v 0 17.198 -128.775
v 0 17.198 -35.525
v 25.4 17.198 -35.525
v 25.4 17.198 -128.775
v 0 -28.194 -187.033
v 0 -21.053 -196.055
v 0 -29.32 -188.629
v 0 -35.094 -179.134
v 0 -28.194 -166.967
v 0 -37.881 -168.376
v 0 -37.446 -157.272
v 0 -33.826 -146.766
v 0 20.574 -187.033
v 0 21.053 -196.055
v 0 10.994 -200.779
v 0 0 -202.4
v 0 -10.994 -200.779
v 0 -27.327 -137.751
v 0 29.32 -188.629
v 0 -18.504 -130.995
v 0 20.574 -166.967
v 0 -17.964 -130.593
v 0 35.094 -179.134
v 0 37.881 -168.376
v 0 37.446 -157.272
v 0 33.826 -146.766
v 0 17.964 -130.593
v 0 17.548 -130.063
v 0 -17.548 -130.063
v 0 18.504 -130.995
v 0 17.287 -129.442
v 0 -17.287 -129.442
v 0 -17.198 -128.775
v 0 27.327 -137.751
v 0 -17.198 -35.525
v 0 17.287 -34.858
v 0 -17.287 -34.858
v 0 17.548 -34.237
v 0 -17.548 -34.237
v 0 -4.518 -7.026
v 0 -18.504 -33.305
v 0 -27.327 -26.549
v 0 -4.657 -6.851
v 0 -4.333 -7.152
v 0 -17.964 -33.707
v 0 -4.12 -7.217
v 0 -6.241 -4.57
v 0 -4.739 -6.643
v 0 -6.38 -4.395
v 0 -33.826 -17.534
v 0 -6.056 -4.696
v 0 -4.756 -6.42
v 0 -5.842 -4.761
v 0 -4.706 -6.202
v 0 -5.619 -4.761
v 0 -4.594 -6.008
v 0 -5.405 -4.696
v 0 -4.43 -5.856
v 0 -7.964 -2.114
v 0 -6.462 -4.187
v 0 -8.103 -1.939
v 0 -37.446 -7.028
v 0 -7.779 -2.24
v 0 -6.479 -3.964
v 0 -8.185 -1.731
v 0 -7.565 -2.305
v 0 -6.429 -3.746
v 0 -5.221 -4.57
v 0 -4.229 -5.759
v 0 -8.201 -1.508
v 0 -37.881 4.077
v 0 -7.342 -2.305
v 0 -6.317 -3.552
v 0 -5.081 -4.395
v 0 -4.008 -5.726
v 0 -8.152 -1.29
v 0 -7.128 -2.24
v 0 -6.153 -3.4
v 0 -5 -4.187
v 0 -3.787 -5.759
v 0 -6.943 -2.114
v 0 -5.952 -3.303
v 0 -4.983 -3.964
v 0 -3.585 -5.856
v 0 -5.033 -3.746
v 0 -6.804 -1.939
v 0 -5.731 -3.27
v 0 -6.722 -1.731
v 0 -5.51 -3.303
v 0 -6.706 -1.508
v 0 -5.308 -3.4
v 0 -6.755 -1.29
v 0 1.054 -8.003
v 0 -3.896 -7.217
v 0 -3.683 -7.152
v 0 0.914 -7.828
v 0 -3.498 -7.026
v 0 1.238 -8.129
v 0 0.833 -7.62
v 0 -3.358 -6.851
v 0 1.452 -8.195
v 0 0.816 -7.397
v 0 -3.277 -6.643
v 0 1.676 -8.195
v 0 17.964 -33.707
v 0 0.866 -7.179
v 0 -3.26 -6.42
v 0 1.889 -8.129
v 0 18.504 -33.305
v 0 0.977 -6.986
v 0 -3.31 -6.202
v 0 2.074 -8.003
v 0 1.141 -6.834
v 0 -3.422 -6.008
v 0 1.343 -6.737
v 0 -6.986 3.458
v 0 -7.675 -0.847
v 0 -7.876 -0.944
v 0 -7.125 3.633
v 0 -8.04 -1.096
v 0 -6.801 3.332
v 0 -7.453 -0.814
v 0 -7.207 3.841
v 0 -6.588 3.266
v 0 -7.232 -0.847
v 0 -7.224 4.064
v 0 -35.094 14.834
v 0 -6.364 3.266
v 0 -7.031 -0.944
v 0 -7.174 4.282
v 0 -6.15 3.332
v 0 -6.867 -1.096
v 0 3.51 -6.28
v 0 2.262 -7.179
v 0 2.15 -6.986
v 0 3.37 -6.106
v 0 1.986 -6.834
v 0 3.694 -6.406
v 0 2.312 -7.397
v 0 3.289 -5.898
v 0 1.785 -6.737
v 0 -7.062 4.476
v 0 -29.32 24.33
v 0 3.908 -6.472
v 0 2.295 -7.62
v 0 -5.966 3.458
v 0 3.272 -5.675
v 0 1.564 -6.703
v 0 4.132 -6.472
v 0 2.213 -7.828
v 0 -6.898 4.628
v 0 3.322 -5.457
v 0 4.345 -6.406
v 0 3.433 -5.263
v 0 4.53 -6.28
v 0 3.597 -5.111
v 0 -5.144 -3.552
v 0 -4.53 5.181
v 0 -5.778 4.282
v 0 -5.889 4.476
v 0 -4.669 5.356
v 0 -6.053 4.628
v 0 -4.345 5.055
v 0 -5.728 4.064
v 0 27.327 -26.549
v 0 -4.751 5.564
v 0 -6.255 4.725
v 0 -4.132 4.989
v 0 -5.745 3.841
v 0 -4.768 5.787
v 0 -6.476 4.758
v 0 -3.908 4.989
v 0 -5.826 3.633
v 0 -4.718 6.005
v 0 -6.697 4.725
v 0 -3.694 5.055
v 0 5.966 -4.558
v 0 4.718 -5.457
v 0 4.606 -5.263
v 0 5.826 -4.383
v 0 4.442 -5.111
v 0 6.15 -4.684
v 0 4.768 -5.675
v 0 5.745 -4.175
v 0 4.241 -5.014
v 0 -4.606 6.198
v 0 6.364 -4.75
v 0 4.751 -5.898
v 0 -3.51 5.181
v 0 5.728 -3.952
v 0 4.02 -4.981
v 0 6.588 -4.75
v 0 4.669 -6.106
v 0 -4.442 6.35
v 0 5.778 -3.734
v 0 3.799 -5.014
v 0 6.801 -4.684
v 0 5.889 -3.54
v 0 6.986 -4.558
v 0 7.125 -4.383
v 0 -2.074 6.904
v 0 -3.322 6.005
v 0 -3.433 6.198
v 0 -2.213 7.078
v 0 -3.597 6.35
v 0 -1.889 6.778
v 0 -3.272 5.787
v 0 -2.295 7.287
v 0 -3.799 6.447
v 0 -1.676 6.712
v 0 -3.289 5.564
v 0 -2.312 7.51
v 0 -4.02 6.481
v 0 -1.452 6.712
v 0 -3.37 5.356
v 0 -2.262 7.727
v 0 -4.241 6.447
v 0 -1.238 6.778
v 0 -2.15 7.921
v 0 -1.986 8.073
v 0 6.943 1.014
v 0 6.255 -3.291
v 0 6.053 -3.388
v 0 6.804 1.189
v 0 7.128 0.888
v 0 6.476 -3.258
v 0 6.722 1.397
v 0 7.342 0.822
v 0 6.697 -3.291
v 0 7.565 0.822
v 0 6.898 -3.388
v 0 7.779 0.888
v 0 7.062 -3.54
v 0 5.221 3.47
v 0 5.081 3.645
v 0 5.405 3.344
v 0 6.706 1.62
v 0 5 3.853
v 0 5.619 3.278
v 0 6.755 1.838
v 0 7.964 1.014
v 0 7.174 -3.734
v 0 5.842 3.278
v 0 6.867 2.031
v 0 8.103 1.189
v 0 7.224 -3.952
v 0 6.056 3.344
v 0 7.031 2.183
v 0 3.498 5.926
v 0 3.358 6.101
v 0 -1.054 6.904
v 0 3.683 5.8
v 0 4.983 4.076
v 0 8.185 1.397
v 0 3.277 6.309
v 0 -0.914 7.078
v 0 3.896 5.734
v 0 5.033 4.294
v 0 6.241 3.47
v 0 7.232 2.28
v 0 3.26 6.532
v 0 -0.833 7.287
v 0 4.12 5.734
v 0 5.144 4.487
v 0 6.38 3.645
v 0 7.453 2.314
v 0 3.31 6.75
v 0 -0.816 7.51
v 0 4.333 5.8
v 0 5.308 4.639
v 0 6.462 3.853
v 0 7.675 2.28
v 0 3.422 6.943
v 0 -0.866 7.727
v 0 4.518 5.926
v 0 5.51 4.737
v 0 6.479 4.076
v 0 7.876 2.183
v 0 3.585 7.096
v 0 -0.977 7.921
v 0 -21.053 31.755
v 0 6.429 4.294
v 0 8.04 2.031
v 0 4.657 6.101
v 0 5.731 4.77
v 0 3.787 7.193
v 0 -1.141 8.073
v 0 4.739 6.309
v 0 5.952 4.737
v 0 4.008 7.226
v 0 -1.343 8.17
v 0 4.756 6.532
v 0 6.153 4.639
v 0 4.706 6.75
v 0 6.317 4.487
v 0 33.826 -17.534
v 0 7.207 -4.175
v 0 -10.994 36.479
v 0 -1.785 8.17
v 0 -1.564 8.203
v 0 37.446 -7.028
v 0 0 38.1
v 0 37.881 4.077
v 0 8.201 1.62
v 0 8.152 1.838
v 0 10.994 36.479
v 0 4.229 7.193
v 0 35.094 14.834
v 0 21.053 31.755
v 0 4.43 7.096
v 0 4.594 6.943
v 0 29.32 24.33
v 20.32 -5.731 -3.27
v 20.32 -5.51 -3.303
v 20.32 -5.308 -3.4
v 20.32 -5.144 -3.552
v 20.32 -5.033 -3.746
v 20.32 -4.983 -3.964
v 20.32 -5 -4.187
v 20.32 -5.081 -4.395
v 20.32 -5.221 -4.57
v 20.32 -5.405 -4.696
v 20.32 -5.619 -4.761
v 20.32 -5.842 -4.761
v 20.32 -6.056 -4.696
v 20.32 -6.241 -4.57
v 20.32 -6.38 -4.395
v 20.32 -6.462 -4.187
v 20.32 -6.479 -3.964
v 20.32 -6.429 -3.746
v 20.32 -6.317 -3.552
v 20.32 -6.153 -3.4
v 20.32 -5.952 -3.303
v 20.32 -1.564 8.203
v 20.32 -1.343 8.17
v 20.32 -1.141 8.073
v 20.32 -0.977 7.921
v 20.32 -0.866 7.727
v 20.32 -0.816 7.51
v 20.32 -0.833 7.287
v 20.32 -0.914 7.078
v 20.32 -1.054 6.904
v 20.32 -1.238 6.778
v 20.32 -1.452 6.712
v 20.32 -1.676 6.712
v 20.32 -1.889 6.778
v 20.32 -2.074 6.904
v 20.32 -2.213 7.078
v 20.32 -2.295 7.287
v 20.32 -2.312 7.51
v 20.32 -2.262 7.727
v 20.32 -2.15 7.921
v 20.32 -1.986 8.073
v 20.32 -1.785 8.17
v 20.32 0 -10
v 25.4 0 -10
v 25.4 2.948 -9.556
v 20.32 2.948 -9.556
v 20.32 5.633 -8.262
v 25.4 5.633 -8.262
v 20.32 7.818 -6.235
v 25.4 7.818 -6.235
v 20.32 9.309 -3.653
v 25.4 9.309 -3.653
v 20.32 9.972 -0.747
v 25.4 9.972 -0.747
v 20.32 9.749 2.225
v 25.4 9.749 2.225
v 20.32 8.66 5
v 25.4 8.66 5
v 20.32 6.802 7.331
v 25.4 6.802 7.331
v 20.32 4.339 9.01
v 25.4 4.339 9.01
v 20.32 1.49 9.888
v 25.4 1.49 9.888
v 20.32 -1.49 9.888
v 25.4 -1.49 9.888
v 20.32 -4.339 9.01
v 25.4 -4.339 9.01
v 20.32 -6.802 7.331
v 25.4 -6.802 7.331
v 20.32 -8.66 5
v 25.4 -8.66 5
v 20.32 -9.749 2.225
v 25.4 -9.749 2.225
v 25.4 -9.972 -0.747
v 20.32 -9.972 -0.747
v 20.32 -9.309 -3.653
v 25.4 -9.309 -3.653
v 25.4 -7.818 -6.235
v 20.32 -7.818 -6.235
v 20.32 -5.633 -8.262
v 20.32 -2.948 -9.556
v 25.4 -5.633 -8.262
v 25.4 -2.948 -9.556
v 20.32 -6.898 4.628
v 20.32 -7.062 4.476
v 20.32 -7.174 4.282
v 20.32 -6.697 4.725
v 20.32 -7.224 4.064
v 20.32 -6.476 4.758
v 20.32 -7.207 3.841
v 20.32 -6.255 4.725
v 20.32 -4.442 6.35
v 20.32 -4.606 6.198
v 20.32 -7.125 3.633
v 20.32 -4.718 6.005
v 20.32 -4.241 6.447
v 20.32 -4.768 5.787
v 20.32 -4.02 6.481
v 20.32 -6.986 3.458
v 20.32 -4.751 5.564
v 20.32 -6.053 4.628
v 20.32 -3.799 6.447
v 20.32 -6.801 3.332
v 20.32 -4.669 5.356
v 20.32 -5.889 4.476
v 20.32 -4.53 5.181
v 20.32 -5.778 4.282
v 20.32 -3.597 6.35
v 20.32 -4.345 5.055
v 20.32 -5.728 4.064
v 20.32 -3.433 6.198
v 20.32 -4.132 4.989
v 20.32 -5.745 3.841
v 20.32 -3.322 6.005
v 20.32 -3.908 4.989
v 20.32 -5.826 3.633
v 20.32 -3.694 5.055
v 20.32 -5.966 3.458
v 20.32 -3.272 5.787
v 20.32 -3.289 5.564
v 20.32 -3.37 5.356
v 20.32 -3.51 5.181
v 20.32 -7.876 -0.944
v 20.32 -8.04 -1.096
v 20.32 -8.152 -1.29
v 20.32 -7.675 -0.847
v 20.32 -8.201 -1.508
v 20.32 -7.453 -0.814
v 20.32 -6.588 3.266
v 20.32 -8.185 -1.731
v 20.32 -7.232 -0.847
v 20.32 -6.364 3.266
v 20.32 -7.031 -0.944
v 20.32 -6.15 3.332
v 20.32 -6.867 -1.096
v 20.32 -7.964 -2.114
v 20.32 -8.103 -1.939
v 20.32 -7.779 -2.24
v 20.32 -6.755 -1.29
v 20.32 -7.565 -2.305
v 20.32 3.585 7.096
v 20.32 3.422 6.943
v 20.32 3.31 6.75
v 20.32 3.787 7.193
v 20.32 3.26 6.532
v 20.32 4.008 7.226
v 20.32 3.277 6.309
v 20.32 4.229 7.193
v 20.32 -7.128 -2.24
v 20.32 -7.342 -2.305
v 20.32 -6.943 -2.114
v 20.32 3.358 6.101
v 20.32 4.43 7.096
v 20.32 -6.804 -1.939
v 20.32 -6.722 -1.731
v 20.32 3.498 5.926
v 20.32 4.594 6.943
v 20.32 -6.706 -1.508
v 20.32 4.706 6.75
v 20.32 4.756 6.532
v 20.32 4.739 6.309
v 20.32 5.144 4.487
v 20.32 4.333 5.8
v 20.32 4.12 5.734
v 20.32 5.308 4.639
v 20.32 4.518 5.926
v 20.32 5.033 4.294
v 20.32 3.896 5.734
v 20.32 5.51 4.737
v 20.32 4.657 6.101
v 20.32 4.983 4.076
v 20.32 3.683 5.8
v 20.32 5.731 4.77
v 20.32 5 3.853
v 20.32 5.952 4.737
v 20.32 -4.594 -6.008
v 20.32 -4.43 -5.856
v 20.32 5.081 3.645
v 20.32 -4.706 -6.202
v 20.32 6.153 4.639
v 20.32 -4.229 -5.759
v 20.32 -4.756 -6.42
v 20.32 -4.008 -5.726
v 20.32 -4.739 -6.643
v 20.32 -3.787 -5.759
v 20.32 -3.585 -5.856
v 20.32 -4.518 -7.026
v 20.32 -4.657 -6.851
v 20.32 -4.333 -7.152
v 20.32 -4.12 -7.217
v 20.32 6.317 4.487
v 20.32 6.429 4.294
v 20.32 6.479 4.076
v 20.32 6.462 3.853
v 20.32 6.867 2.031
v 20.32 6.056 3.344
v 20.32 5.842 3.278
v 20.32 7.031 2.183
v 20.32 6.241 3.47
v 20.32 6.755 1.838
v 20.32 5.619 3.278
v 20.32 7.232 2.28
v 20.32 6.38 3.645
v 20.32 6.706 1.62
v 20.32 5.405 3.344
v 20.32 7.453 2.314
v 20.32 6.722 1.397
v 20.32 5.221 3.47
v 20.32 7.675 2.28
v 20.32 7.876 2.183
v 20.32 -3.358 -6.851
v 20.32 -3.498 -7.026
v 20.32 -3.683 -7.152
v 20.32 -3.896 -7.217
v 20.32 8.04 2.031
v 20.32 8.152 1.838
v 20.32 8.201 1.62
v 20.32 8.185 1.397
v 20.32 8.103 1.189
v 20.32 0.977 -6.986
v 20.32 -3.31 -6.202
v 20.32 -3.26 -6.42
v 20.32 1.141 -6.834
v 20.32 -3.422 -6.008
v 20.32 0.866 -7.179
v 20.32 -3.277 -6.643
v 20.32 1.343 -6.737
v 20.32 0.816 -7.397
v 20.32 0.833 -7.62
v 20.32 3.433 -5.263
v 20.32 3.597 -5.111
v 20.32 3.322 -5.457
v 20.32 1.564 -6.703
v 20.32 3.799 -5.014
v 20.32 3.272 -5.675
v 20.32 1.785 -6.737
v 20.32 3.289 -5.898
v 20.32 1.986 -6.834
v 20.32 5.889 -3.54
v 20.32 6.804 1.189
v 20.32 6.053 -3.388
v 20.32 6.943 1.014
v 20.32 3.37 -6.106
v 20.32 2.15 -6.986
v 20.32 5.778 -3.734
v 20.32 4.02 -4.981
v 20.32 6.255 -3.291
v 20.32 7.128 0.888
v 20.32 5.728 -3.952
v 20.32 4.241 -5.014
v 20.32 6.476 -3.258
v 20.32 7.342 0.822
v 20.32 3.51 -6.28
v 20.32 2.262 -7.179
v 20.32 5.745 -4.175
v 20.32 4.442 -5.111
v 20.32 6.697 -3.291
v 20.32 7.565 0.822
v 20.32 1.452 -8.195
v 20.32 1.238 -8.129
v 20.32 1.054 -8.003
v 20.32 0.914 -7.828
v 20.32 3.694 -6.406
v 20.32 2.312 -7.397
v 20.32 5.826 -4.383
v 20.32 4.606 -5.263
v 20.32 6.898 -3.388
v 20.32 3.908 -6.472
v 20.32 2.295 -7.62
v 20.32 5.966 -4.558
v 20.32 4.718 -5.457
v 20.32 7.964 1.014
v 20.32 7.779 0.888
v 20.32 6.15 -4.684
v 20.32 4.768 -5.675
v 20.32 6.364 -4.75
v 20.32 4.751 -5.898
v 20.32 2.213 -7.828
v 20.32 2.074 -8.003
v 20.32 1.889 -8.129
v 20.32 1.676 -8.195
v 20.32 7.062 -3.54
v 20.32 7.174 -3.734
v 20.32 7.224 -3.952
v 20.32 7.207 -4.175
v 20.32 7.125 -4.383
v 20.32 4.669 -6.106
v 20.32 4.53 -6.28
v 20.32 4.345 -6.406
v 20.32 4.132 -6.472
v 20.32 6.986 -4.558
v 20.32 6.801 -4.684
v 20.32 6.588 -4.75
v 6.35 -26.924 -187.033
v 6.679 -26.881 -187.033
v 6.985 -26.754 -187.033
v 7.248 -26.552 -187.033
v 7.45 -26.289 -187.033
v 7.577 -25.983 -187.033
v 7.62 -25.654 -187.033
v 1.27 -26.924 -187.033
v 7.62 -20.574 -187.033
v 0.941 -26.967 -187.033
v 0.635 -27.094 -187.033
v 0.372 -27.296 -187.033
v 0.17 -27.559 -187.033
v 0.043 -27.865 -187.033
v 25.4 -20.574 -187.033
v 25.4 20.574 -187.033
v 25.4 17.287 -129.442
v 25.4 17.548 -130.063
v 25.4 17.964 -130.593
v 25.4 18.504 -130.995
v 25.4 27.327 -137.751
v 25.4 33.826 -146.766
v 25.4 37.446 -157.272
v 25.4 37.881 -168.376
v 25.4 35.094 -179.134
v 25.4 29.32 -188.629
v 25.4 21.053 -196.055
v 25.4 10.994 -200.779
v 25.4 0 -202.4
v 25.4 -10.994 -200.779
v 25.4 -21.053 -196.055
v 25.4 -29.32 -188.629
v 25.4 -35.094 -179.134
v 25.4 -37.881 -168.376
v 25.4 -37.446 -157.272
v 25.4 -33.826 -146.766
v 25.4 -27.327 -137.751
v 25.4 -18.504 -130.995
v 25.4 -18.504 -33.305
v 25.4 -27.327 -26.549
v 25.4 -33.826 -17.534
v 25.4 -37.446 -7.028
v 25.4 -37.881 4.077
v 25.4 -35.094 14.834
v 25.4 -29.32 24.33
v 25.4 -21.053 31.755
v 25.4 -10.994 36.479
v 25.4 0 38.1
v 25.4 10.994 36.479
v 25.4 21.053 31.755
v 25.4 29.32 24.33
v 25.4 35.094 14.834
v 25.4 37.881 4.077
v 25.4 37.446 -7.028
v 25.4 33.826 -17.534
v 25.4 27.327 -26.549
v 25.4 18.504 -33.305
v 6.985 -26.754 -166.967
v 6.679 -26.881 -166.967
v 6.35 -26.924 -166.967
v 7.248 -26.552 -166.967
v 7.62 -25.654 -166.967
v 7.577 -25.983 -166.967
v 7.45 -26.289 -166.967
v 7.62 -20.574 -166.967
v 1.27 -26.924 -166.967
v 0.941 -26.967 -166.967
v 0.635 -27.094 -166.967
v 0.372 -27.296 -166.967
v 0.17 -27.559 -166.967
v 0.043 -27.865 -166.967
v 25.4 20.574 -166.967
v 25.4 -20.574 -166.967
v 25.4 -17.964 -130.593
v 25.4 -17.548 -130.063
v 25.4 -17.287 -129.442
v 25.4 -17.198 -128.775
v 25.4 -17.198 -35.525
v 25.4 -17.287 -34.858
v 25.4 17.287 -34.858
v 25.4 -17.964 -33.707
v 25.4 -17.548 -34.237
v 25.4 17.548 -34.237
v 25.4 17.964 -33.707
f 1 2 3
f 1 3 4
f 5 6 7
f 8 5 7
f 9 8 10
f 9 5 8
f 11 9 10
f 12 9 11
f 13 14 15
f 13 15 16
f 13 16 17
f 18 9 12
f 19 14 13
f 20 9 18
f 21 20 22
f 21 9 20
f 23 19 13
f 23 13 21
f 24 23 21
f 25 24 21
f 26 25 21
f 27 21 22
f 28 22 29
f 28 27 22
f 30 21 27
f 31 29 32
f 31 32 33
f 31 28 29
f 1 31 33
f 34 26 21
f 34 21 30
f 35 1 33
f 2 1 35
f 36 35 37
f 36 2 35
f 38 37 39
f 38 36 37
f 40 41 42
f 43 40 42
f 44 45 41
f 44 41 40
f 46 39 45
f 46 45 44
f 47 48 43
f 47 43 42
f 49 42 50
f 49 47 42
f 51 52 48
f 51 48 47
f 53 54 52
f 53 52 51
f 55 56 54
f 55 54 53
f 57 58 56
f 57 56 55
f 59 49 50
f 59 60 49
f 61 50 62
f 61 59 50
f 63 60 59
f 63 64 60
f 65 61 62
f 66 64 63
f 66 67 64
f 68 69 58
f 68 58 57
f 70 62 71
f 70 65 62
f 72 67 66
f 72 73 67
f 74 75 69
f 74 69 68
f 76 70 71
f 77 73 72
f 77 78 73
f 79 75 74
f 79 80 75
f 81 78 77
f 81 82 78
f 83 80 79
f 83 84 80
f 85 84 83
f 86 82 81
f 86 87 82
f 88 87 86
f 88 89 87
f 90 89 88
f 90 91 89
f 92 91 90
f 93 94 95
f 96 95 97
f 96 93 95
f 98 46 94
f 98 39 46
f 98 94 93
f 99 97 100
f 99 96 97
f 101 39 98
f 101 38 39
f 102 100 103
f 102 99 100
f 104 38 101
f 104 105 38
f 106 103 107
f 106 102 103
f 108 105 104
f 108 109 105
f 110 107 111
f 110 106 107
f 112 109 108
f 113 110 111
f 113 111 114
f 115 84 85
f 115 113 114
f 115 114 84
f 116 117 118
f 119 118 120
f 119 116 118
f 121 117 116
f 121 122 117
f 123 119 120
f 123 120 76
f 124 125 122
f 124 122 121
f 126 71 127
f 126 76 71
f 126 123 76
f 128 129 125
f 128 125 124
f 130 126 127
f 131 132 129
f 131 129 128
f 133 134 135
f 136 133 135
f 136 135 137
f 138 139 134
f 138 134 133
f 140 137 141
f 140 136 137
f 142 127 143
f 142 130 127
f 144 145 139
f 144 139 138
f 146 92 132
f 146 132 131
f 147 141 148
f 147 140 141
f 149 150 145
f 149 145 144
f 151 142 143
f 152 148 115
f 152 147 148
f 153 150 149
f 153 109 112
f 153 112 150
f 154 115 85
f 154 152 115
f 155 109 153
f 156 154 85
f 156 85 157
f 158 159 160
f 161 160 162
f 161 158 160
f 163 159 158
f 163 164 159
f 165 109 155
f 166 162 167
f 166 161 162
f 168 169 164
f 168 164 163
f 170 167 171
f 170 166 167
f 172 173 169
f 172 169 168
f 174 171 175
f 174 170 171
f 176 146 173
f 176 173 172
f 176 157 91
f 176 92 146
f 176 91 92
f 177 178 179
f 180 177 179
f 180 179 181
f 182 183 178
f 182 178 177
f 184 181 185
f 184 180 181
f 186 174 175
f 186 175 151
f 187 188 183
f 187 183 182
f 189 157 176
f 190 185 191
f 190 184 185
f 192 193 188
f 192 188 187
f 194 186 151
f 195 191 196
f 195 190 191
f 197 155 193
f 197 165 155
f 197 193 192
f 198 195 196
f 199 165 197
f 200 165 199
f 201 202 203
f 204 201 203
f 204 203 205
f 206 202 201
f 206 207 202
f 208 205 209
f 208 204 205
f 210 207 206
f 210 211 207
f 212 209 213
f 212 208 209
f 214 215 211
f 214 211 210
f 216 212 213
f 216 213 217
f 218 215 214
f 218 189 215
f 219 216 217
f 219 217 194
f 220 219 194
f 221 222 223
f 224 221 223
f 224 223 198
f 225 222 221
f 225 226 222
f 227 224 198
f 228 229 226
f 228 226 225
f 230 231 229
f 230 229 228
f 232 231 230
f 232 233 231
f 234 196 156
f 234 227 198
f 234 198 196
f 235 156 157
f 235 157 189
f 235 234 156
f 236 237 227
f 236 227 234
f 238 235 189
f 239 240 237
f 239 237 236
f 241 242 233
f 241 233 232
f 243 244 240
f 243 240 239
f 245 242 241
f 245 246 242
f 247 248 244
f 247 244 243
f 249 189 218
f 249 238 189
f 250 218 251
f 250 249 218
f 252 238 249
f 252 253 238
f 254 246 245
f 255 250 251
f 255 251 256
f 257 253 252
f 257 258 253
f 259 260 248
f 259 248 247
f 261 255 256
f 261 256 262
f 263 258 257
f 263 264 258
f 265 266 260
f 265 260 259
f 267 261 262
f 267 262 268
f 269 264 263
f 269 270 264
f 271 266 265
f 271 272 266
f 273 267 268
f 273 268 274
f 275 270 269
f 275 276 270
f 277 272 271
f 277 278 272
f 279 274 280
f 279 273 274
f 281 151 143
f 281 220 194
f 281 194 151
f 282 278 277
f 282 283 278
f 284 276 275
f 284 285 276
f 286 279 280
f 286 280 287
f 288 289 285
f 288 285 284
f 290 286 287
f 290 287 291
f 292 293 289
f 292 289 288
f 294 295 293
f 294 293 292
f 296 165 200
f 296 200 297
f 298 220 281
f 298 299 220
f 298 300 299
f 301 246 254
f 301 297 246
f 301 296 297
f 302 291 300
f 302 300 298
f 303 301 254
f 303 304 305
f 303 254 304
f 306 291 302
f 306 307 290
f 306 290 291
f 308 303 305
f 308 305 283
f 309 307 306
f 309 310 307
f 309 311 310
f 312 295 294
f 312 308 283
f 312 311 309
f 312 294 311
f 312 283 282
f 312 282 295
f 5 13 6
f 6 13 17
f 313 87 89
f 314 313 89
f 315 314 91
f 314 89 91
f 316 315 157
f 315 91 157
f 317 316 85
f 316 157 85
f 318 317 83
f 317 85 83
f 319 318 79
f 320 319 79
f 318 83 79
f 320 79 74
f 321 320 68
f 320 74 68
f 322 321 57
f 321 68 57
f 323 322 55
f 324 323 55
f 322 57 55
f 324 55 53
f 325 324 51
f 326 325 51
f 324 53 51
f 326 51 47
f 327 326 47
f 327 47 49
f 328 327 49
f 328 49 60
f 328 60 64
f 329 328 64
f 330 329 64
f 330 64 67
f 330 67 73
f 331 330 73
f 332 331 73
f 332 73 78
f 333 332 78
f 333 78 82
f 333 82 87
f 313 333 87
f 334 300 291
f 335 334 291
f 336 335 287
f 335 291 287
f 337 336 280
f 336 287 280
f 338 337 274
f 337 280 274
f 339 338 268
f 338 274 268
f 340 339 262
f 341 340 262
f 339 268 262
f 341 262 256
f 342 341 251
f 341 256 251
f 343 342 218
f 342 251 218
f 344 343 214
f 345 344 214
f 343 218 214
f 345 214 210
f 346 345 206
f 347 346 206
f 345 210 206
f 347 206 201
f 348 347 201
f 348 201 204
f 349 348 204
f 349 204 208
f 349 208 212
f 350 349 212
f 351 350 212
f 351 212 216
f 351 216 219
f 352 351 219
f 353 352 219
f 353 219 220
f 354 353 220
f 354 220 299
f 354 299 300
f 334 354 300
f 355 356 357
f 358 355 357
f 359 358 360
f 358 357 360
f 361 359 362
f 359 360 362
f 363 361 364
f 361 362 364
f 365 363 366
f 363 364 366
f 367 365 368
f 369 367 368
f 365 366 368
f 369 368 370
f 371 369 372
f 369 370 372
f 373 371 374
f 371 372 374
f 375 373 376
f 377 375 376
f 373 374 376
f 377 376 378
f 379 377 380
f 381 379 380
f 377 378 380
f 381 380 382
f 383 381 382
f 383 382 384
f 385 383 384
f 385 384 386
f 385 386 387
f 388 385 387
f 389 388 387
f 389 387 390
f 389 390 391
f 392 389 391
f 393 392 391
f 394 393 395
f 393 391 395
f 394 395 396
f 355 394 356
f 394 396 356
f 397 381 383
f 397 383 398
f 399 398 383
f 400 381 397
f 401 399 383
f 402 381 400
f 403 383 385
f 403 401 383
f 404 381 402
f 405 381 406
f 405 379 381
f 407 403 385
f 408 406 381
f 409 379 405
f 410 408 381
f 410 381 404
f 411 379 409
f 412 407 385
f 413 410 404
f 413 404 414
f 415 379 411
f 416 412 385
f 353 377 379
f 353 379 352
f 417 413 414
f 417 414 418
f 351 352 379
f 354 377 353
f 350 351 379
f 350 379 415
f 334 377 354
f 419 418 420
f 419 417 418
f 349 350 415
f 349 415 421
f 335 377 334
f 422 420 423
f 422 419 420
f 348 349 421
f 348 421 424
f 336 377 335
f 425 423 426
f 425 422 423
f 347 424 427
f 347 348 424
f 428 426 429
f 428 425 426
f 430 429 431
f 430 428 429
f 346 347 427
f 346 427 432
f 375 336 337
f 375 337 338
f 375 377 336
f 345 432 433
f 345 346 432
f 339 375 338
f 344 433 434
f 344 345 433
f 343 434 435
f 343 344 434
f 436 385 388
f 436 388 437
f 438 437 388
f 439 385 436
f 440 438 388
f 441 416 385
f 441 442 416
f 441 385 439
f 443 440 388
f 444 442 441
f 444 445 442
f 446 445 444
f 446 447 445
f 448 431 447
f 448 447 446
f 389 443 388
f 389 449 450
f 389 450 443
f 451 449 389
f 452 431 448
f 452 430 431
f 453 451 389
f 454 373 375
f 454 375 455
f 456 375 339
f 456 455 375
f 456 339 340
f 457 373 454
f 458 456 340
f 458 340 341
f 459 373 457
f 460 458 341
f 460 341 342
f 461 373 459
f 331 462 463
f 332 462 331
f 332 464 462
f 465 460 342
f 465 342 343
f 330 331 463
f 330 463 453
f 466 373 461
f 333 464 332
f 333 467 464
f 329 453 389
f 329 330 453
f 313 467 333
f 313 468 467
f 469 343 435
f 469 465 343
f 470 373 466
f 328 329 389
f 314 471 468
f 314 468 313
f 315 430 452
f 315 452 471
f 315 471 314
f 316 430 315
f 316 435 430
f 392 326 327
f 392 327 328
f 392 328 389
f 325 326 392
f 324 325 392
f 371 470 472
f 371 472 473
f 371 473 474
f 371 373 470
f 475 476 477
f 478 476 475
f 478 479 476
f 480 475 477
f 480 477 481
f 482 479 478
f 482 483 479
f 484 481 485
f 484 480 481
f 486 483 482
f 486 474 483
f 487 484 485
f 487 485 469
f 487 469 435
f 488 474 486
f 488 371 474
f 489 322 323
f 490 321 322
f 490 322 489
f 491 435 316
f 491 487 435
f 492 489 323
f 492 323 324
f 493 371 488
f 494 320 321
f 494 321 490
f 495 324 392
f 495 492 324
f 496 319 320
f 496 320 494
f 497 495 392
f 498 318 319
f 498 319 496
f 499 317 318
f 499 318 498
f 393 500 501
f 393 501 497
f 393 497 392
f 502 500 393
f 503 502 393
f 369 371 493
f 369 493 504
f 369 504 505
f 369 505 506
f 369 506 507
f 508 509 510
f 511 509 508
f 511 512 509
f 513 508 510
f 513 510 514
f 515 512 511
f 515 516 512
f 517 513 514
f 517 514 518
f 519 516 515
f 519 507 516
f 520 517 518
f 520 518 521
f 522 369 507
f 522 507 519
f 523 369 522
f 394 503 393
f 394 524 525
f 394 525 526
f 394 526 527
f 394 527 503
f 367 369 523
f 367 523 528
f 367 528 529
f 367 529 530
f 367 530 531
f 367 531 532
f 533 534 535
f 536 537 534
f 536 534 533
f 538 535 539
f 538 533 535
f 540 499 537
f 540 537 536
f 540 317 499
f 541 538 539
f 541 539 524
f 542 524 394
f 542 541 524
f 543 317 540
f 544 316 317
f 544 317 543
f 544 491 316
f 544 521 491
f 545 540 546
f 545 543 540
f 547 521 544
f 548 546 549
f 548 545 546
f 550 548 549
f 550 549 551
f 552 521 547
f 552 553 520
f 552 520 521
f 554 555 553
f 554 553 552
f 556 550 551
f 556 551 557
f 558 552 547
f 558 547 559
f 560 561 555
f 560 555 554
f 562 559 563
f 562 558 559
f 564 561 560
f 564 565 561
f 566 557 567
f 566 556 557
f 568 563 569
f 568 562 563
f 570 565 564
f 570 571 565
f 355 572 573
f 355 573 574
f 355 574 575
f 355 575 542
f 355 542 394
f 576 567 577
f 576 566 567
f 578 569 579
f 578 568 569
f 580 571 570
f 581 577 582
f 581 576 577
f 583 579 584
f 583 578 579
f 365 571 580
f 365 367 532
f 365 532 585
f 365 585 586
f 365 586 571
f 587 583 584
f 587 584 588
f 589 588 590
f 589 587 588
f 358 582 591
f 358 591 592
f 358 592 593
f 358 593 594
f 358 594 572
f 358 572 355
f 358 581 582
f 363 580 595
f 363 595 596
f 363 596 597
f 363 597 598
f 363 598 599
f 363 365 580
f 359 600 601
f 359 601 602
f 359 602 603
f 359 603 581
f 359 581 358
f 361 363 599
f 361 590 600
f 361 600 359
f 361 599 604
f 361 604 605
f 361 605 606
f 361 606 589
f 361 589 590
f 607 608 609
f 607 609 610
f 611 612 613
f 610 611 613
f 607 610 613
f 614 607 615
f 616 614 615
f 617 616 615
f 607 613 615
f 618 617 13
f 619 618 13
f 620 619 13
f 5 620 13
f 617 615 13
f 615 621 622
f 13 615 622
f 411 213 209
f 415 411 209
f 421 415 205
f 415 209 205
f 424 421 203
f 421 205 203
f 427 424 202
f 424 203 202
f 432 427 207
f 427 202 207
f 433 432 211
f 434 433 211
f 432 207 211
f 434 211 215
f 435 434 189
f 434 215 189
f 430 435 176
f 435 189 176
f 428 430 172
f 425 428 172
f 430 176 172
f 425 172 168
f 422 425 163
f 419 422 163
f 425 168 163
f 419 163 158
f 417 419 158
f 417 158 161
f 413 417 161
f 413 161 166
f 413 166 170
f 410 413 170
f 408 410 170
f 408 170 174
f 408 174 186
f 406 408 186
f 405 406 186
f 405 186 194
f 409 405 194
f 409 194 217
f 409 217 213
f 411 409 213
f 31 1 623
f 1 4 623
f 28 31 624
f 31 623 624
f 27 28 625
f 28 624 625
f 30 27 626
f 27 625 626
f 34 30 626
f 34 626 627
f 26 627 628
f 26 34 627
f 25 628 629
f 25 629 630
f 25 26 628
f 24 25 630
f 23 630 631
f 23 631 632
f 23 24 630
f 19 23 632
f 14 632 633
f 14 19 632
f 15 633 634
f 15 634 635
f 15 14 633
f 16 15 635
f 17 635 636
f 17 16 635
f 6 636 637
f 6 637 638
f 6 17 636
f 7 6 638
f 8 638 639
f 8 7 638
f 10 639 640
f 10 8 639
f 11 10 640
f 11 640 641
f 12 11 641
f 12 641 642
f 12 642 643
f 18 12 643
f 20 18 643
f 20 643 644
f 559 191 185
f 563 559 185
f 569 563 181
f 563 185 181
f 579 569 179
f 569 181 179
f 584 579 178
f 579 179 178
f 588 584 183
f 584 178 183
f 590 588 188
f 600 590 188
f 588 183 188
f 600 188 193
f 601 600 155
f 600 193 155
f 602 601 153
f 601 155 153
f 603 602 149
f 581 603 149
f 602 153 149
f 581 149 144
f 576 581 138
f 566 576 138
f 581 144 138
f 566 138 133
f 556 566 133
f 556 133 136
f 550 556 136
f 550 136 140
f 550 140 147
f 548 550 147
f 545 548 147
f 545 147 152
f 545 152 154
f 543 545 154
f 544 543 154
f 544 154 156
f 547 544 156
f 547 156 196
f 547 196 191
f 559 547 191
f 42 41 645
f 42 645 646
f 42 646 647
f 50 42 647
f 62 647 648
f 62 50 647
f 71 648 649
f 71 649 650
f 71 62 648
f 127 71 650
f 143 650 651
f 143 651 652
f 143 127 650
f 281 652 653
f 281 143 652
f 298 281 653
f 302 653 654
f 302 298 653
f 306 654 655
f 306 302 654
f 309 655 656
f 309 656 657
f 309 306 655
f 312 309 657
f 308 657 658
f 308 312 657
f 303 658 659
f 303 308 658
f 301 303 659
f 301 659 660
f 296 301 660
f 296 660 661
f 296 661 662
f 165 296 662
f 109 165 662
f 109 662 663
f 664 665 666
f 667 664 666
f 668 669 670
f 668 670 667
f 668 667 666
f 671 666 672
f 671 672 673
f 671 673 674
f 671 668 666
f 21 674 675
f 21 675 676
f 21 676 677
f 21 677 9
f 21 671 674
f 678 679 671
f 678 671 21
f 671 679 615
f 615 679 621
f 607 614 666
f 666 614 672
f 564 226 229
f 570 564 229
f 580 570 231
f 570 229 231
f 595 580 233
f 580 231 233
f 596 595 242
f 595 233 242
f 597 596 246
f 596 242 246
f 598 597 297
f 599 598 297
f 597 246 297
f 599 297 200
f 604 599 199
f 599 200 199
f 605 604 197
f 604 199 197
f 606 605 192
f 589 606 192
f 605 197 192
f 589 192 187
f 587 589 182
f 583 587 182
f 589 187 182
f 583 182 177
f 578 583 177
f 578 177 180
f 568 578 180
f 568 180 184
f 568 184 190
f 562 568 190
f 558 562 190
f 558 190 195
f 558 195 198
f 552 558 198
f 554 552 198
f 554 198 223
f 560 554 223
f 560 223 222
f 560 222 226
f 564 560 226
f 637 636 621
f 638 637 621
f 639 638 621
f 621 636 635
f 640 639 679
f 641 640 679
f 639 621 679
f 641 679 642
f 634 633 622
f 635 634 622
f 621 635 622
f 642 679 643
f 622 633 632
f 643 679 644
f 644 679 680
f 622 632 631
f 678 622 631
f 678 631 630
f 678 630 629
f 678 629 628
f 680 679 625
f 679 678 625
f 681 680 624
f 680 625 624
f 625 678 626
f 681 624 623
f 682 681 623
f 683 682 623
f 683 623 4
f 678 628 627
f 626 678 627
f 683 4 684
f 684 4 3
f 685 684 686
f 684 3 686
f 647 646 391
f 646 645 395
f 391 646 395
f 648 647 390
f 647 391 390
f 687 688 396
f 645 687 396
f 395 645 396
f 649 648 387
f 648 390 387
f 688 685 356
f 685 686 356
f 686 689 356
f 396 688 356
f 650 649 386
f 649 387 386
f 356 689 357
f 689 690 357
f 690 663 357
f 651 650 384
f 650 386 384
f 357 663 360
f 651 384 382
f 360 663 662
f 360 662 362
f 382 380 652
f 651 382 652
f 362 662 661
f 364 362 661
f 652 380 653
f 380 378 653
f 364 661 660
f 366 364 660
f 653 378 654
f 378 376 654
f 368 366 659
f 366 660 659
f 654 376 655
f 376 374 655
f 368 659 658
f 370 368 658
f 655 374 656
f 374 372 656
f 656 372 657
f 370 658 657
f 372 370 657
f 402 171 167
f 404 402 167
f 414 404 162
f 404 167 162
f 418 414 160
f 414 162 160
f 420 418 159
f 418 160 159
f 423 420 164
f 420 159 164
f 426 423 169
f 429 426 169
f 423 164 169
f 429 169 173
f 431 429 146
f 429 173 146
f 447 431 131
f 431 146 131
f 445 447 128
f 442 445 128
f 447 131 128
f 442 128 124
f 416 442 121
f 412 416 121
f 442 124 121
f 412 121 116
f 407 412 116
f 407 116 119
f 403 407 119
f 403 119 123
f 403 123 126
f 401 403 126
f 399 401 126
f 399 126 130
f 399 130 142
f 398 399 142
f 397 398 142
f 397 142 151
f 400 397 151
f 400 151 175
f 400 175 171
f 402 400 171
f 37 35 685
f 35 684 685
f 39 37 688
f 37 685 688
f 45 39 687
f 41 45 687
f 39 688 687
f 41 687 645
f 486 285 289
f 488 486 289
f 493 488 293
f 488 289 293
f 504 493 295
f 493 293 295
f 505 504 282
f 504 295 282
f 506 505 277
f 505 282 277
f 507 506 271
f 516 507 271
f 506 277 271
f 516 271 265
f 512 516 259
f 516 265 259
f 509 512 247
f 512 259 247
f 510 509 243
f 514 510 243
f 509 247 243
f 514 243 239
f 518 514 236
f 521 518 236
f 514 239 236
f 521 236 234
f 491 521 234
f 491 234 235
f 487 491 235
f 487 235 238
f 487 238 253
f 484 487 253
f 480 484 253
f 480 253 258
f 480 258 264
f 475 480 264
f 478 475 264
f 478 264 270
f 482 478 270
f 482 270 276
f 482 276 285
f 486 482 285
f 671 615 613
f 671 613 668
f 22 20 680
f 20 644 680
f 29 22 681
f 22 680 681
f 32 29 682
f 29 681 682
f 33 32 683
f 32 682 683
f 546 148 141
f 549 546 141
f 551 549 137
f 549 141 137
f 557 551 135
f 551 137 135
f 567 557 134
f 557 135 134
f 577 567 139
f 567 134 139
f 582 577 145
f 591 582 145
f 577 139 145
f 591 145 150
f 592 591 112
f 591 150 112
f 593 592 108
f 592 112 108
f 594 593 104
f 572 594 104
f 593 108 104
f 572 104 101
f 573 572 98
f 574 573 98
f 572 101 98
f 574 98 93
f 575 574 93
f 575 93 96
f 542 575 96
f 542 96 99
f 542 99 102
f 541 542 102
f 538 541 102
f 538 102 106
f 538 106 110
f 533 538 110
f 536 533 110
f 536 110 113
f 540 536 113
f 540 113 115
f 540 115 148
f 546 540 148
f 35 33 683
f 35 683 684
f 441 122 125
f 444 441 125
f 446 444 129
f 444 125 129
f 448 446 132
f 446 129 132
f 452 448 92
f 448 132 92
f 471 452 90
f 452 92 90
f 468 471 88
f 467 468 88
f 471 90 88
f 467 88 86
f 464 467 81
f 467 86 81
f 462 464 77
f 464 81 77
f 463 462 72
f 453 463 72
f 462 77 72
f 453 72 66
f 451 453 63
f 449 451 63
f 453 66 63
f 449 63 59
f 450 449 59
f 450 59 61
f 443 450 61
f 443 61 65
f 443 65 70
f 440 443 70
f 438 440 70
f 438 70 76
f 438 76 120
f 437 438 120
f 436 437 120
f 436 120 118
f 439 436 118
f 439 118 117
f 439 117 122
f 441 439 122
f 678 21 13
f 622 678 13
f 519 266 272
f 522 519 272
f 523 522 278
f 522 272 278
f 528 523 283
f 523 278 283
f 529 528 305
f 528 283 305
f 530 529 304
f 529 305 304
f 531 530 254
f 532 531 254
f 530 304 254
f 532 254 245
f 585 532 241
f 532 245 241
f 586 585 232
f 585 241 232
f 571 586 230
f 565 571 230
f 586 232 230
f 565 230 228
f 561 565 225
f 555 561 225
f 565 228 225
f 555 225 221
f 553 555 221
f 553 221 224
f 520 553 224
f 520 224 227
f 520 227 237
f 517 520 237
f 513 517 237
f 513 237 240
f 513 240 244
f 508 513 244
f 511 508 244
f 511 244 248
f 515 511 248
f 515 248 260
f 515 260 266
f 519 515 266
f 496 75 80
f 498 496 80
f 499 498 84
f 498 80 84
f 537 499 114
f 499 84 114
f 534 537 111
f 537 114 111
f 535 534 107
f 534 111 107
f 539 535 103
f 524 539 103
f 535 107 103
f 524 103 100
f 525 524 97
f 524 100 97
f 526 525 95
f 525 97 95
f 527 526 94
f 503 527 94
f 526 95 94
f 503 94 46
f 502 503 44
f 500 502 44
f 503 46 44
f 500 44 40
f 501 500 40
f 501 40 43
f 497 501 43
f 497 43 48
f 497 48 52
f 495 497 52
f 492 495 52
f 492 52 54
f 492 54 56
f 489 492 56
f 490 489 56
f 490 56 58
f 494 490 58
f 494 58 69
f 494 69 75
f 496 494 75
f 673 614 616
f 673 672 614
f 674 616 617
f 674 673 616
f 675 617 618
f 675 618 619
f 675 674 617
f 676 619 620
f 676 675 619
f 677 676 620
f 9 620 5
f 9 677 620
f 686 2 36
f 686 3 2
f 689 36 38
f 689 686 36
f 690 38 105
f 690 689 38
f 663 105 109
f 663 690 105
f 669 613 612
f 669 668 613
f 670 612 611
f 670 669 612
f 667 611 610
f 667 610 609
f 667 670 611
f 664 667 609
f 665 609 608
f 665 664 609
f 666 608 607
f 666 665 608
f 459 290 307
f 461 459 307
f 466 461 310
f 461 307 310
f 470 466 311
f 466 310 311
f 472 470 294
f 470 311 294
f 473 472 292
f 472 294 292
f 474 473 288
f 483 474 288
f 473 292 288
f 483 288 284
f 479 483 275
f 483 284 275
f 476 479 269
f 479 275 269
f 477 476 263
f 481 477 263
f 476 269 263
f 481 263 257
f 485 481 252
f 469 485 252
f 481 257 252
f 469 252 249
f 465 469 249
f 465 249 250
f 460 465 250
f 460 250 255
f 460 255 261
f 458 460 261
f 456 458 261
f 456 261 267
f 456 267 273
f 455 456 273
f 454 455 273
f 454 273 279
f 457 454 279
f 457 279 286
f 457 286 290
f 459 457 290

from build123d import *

# Parameters (mm, degrees)
BOSS_EXTRUDE1_DEPTH = 25.4
FILLET1_R           = 2.54
SKETCH2_R           = 10
CUT_EXTRUDE2_DEPTH  = 5.08
CUT_EXTRUDE3_REACH  = 209.515
SKETCH6_W           = 20.066
SKETCH6_H           = 41.148
SKETCH9_W           = 20.066
SKETCH9_H           = 6.35
CUT_EXTRUDE6_DEPTH  = 7.62
FILLET2_R           = 1.27
CUT_EXTRUDE7_REACH  = 209.515
SKETCH10_R          = 0.75


with BuildPart() as part:
    # Sketch1 → Boss-Extrude1 (new body)
    with BuildSketch(Plane(origin=(0, 0, 0), x_dir=(0, 0, -1), z_dir=(1, 0, 0))):
        with BuildLine():
            Line((33.997808163, 17.197646354), (130.301908565, 17.197646354))
            ThreePointArc((130.301908565, 17.197646354), (202.399716728, 0), (130.301908565, -17.197646354))
            Line((130.301908565, -17.197646354), (33.997808163, -17.197646354))
            ThreePointArc((33.997808163, -17.197646354), (-38.1, 0), (33.997808163, 17.197646354))
        make_face()
    extrude(amount=BOSS_EXTRUDE1_DEPTH)

    # Fillet1
    fillet1_edges = [part.edges().sort_by_distance(p)[0] for p in [
        (12.7, 17.197646354, -33.997808163),
        (12.7, 17.197646354, -130.301908565),
        (12.7, -17.197646354, -130.301908565),
        (12.7, -17.197646354, -33.997808163),
    ]]
    fillet(fillet1_edges, radius=FILLET1_R)

    # Sketch2 → Cut-Extrude2 (cut)
    with BuildSketch(Plane(origin=(25.4, 0, 0), x_dir=(0, 0, -1), z_dir=(1, 0, 0))):
        Circle(SKETCH2_R)
    extrude(amount=-CUT_EXTRUDE2_DEPTH, mode=Mode.SUBTRACT)

    # Sketch6 → Cut-Extrude3 (cut, up to next)
    with BuildSketch(Plane(origin=(25.4, 0, 0), x_dir=(0, 0, -1), z_dir=(1, 0, 0)), mode=Mode.PRIVATE) as cut_extrude3_sk1:
        with Locations((176.999716728, 0)):
            Rectangle(SKETCH6_W, SKETCH6_H)
    cut_extrude3_tool1 = extrude(cut_extrude3_sk1.sketch, amount=-CUT_EXTRUDE3_REACH, mode=Mode.PRIVATE) & part.part
    add(cut_extrude3_tool1.solids().sort_by_distance((25.4, 0, -176.999717))[0], mode=Mode.SUBTRACT)

    # Sketch9 → Cut-Extrude6 (cut)
    with BuildSketch(Plane.ZY):
        with Locations((-176.999716728, -23.749)):
            Rectangle(SKETCH9_W, SKETCH9_H)
    extrude(amount=-CUT_EXTRUDE6_DEPTH, mode=Mode.SUBTRACT)

    # Fillet2
    fillet2_edges = [part.edges().sort_by_distance(p)[0] for p in [
        (7.62, -26.924, -176.999716728),
        (0, -26.924, -176.999716728),
    ]]
    fillet(fillet2_edges, radius=FILLET2_R)

    # Sketch10 → Cut-Extrude7 (cut, up to next)
    with BuildSketch(Plane.ZY, mode=Mode.PRIVATE) as cut_extrude7_sk1:
        with Locations((-4.019820442, -5.730710568)):
            Circle(SKETCH10_R)
    cut_extrude7_tool1 = extrude(cut_extrude7_sk1.sketch, amount=-CUT_EXTRUDE7_REACH, mode=Mode.PRIVATE) & part.part
    # Sketch10 → Cut-Extrude7 (cut, up to next)
    with BuildSketch(Plane.ZY, mode=Mode.PRIVATE) as cut_extrude7_sk2:
        with Locations((-6.475839257, -4.007930379)):
            Circle(SKETCH10_R)
    cut_extrude7_tool2 = extrude(cut_extrude7_sk2.sketch, amount=-CUT_EXTRUDE7_REACH, mode=Mode.PRIVATE) & part.part
    # Sketch10 → Cut-Extrude7 (cut, up to next)
    with BuildSketch(Plane.ZY, mode=Mode.PRIVATE) as cut_extrude7_sk3:
        with Locations((-1.563801627, -7.453490757)):
            Circle(SKETCH10_R)
    cut_extrude7_tool3 = extrude(cut_extrude7_sk3.sketch, amount=-CUT_EXTRUDE7_REACH, mode=Mode.PRIVATE) & part.part
    # Sketch10 → Cut-Extrude7 (cut, up to next)
    with BuildSketch(Plane.ZY, mode=Mode.PRIVATE) as cut_extrude7_sk4:
        with Locations((4.007930379, -6.475839257)):
            Circle(SKETCH10_R)
    cut_extrude7_tool4 = extrude(cut_extrude7_sk4.sketch, amount=-CUT_EXTRUDE7_REACH, mode=Mode.PRIVATE) & part.part
    # Sketch10 → Cut-Extrude7 (cut, up to next)
    with BuildSketch(Plane.ZY, mode=Mode.PRIVATE) as cut_extrude7_sk5:
        with Locations((5.730710568, -4.019820442)):
            Circle(SKETCH10_R)
    cut_extrude7_tool5 = extrude(cut_extrude7_sk5.sketch, amount=-CUT_EXTRUDE7_REACH, mode=Mode.PRIVATE) & part.part
    # Sketch10 → Cut-Extrude7 (cut, up to next)
    with BuildSketch(Plane.ZY, mode=Mode.PRIVATE) as cut_extrude7_sk6:
        with Locations((7.453490757, -1.563801627)):
            Circle(SKETCH10_R)
    cut_extrude7_tool6 = extrude(cut_extrude7_sk6.sketch, amount=-CUT_EXTRUDE7_REACH, mode=Mode.PRIVATE) & part.part
    # Sketch10 → Cut-Extrude7 (cut, up to next)
    with BuildSketch(Plane.ZY, mode=Mode.PRIVATE) as cut_extrude7_sk7:
        with Locations((6.475839257, 4.007930379)):
            Circle(SKETCH10_R)
    cut_extrude7_tool7 = extrude(cut_extrude7_sk7.sketch, amount=-CUT_EXTRUDE7_REACH, mode=Mode.PRIVATE) & part.part
    # Sketch10 → Cut-Extrude7 (cut, up to next)
    with BuildSketch(Plane.ZY, mode=Mode.PRIVATE) as cut_extrude7_sk8:
        with Locations((4.019820442, 5.730710568)):
            Circle(SKETCH10_R)
    cut_extrude7_tool8 = extrude(cut_extrude7_sk8.sketch, amount=-CUT_EXTRUDE7_REACH, mode=Mode.PRIVATE) & part.part
    # Sketch10 → Cut-Extrude7 (cut, up to next)
    with BuildSketch(Plane.ZY, mode=Mode.PRIVATE) as cut_extrude7_sk9:
        with Locations((1.563801627, 7.453490757)):
            Circle(SKETCH10_R)
    cut_extrude7_tool9 = extrude(cut_extrude7_sk9.sketch, amount=-CUT_EXTRUDE7_REACH, mode=Mode.PRIVATE) & part.part
    # Sketch10 → Cut-Extrude7 (cut, up to next)
    with BuildSketch(Plane.ZY, mode=Mode.PRIVATE) as cut_extrude7_sk10:
        with Locations((-4.007930379, 6.475839257)):
            Circle(SKETCH10_R)
    cut_extrude7_tool10 = extrude(cut_extrude7_sk10.sketch, amount=-CUT_EXTRUDE7_REACH, mode=Mode.PRIVATE) & part.part
    # Sketch10 → Cut-Extrude7 (cut, up to next)
    with BuildSketch(Plane.ZY, mode=Mode.PRIVATE) as cut_extrude7_sk11:
        with Locations((-5.730710568, 4.019820442)):
            Circle(SKETCH10_R)
    cut_extrude7_tool11 = extrude(cut_extrude7_sk11.sketch, amount=-CUT_EXTRUDE7_REACH, mode=Mode.PRIVATE) & part.part
    # Sketch10 → Cut-Extrude7 (cut, up to next)
    with BuildSketch(Plane.ZY, mode=Mode.PRIVATE) as cut_extrude7_sk12:
        with Locations((-7.453490757, 1.563801627)):
            Circle(SKETCH10_R)
    cut_extrude7_tool12 = extrude(cut_extrude7_sk12.sketch, amount=-CUT_EXTRUDE7_REACH, mode=Mode.PRIVATE) & part.part
    add(cut_extrude7_tool1.solids().sort_by_distance((0, -5.730711, -4.01982))[0], mode=Mode.SUBTRACT)
    add(cut_extrude7_tool2.solids().sort_by_distance((0, -4.00793, -6.475839))[0], mode=Mode.SUBTRACT)
    add(cut_extrude7_tool3.solids().sort_by_distance((0, -7.453491, -1.563802))[0], mode=Mode.SUBTRACT)
    add(cut_extrude7_tool4.solids().sort_by_distance((0, -6.475839, 4.00793))[0], mode=Mode.SUBTRACT)
    add(cut_extrude7_tool5.solids().sort_by_distance((0, -4.01982, 5.730711))[0], mode=Mode.SUBTRACT)
    add(cut_extrude7_tool6.solids().sort_by_distance((0, -1.563802, 7.453491))[0], mode=Mode.SUBTRACT)
    add(cut_extrude7_tool7.solids().sort_by_distance((0, 4.00793, 6.475839))[0], mode=Mode.SUBTRACT)
    add(cut_extrude7_tool8.solids().sort_by_distance((0, 5.730711, 4.01982))[0], mode=Mode.SUBTRACT)
    add(cut_extrude7_tool9.solids().sort_by_distance((0, 7.453491, 1.563802))[0], mode=Mode.SUBTRACT)
    add(cut_extrude7_tool10.solids().sort_by_distance((0, 6.475839, -4.00793))[0], mode=Mode.SUBTRACT)
    add(cut_extrude7_tool11.solids().sort_by_distance((0, 4.01982, -5.730711))[0], mode=Mode.SUBTRACT)
    add(cut_extrude7_tool12.solids().sort_by_distance((0, 1.563802, -7.453491))[0], mode=Mode.SUBTRACT)


solid = part.part
